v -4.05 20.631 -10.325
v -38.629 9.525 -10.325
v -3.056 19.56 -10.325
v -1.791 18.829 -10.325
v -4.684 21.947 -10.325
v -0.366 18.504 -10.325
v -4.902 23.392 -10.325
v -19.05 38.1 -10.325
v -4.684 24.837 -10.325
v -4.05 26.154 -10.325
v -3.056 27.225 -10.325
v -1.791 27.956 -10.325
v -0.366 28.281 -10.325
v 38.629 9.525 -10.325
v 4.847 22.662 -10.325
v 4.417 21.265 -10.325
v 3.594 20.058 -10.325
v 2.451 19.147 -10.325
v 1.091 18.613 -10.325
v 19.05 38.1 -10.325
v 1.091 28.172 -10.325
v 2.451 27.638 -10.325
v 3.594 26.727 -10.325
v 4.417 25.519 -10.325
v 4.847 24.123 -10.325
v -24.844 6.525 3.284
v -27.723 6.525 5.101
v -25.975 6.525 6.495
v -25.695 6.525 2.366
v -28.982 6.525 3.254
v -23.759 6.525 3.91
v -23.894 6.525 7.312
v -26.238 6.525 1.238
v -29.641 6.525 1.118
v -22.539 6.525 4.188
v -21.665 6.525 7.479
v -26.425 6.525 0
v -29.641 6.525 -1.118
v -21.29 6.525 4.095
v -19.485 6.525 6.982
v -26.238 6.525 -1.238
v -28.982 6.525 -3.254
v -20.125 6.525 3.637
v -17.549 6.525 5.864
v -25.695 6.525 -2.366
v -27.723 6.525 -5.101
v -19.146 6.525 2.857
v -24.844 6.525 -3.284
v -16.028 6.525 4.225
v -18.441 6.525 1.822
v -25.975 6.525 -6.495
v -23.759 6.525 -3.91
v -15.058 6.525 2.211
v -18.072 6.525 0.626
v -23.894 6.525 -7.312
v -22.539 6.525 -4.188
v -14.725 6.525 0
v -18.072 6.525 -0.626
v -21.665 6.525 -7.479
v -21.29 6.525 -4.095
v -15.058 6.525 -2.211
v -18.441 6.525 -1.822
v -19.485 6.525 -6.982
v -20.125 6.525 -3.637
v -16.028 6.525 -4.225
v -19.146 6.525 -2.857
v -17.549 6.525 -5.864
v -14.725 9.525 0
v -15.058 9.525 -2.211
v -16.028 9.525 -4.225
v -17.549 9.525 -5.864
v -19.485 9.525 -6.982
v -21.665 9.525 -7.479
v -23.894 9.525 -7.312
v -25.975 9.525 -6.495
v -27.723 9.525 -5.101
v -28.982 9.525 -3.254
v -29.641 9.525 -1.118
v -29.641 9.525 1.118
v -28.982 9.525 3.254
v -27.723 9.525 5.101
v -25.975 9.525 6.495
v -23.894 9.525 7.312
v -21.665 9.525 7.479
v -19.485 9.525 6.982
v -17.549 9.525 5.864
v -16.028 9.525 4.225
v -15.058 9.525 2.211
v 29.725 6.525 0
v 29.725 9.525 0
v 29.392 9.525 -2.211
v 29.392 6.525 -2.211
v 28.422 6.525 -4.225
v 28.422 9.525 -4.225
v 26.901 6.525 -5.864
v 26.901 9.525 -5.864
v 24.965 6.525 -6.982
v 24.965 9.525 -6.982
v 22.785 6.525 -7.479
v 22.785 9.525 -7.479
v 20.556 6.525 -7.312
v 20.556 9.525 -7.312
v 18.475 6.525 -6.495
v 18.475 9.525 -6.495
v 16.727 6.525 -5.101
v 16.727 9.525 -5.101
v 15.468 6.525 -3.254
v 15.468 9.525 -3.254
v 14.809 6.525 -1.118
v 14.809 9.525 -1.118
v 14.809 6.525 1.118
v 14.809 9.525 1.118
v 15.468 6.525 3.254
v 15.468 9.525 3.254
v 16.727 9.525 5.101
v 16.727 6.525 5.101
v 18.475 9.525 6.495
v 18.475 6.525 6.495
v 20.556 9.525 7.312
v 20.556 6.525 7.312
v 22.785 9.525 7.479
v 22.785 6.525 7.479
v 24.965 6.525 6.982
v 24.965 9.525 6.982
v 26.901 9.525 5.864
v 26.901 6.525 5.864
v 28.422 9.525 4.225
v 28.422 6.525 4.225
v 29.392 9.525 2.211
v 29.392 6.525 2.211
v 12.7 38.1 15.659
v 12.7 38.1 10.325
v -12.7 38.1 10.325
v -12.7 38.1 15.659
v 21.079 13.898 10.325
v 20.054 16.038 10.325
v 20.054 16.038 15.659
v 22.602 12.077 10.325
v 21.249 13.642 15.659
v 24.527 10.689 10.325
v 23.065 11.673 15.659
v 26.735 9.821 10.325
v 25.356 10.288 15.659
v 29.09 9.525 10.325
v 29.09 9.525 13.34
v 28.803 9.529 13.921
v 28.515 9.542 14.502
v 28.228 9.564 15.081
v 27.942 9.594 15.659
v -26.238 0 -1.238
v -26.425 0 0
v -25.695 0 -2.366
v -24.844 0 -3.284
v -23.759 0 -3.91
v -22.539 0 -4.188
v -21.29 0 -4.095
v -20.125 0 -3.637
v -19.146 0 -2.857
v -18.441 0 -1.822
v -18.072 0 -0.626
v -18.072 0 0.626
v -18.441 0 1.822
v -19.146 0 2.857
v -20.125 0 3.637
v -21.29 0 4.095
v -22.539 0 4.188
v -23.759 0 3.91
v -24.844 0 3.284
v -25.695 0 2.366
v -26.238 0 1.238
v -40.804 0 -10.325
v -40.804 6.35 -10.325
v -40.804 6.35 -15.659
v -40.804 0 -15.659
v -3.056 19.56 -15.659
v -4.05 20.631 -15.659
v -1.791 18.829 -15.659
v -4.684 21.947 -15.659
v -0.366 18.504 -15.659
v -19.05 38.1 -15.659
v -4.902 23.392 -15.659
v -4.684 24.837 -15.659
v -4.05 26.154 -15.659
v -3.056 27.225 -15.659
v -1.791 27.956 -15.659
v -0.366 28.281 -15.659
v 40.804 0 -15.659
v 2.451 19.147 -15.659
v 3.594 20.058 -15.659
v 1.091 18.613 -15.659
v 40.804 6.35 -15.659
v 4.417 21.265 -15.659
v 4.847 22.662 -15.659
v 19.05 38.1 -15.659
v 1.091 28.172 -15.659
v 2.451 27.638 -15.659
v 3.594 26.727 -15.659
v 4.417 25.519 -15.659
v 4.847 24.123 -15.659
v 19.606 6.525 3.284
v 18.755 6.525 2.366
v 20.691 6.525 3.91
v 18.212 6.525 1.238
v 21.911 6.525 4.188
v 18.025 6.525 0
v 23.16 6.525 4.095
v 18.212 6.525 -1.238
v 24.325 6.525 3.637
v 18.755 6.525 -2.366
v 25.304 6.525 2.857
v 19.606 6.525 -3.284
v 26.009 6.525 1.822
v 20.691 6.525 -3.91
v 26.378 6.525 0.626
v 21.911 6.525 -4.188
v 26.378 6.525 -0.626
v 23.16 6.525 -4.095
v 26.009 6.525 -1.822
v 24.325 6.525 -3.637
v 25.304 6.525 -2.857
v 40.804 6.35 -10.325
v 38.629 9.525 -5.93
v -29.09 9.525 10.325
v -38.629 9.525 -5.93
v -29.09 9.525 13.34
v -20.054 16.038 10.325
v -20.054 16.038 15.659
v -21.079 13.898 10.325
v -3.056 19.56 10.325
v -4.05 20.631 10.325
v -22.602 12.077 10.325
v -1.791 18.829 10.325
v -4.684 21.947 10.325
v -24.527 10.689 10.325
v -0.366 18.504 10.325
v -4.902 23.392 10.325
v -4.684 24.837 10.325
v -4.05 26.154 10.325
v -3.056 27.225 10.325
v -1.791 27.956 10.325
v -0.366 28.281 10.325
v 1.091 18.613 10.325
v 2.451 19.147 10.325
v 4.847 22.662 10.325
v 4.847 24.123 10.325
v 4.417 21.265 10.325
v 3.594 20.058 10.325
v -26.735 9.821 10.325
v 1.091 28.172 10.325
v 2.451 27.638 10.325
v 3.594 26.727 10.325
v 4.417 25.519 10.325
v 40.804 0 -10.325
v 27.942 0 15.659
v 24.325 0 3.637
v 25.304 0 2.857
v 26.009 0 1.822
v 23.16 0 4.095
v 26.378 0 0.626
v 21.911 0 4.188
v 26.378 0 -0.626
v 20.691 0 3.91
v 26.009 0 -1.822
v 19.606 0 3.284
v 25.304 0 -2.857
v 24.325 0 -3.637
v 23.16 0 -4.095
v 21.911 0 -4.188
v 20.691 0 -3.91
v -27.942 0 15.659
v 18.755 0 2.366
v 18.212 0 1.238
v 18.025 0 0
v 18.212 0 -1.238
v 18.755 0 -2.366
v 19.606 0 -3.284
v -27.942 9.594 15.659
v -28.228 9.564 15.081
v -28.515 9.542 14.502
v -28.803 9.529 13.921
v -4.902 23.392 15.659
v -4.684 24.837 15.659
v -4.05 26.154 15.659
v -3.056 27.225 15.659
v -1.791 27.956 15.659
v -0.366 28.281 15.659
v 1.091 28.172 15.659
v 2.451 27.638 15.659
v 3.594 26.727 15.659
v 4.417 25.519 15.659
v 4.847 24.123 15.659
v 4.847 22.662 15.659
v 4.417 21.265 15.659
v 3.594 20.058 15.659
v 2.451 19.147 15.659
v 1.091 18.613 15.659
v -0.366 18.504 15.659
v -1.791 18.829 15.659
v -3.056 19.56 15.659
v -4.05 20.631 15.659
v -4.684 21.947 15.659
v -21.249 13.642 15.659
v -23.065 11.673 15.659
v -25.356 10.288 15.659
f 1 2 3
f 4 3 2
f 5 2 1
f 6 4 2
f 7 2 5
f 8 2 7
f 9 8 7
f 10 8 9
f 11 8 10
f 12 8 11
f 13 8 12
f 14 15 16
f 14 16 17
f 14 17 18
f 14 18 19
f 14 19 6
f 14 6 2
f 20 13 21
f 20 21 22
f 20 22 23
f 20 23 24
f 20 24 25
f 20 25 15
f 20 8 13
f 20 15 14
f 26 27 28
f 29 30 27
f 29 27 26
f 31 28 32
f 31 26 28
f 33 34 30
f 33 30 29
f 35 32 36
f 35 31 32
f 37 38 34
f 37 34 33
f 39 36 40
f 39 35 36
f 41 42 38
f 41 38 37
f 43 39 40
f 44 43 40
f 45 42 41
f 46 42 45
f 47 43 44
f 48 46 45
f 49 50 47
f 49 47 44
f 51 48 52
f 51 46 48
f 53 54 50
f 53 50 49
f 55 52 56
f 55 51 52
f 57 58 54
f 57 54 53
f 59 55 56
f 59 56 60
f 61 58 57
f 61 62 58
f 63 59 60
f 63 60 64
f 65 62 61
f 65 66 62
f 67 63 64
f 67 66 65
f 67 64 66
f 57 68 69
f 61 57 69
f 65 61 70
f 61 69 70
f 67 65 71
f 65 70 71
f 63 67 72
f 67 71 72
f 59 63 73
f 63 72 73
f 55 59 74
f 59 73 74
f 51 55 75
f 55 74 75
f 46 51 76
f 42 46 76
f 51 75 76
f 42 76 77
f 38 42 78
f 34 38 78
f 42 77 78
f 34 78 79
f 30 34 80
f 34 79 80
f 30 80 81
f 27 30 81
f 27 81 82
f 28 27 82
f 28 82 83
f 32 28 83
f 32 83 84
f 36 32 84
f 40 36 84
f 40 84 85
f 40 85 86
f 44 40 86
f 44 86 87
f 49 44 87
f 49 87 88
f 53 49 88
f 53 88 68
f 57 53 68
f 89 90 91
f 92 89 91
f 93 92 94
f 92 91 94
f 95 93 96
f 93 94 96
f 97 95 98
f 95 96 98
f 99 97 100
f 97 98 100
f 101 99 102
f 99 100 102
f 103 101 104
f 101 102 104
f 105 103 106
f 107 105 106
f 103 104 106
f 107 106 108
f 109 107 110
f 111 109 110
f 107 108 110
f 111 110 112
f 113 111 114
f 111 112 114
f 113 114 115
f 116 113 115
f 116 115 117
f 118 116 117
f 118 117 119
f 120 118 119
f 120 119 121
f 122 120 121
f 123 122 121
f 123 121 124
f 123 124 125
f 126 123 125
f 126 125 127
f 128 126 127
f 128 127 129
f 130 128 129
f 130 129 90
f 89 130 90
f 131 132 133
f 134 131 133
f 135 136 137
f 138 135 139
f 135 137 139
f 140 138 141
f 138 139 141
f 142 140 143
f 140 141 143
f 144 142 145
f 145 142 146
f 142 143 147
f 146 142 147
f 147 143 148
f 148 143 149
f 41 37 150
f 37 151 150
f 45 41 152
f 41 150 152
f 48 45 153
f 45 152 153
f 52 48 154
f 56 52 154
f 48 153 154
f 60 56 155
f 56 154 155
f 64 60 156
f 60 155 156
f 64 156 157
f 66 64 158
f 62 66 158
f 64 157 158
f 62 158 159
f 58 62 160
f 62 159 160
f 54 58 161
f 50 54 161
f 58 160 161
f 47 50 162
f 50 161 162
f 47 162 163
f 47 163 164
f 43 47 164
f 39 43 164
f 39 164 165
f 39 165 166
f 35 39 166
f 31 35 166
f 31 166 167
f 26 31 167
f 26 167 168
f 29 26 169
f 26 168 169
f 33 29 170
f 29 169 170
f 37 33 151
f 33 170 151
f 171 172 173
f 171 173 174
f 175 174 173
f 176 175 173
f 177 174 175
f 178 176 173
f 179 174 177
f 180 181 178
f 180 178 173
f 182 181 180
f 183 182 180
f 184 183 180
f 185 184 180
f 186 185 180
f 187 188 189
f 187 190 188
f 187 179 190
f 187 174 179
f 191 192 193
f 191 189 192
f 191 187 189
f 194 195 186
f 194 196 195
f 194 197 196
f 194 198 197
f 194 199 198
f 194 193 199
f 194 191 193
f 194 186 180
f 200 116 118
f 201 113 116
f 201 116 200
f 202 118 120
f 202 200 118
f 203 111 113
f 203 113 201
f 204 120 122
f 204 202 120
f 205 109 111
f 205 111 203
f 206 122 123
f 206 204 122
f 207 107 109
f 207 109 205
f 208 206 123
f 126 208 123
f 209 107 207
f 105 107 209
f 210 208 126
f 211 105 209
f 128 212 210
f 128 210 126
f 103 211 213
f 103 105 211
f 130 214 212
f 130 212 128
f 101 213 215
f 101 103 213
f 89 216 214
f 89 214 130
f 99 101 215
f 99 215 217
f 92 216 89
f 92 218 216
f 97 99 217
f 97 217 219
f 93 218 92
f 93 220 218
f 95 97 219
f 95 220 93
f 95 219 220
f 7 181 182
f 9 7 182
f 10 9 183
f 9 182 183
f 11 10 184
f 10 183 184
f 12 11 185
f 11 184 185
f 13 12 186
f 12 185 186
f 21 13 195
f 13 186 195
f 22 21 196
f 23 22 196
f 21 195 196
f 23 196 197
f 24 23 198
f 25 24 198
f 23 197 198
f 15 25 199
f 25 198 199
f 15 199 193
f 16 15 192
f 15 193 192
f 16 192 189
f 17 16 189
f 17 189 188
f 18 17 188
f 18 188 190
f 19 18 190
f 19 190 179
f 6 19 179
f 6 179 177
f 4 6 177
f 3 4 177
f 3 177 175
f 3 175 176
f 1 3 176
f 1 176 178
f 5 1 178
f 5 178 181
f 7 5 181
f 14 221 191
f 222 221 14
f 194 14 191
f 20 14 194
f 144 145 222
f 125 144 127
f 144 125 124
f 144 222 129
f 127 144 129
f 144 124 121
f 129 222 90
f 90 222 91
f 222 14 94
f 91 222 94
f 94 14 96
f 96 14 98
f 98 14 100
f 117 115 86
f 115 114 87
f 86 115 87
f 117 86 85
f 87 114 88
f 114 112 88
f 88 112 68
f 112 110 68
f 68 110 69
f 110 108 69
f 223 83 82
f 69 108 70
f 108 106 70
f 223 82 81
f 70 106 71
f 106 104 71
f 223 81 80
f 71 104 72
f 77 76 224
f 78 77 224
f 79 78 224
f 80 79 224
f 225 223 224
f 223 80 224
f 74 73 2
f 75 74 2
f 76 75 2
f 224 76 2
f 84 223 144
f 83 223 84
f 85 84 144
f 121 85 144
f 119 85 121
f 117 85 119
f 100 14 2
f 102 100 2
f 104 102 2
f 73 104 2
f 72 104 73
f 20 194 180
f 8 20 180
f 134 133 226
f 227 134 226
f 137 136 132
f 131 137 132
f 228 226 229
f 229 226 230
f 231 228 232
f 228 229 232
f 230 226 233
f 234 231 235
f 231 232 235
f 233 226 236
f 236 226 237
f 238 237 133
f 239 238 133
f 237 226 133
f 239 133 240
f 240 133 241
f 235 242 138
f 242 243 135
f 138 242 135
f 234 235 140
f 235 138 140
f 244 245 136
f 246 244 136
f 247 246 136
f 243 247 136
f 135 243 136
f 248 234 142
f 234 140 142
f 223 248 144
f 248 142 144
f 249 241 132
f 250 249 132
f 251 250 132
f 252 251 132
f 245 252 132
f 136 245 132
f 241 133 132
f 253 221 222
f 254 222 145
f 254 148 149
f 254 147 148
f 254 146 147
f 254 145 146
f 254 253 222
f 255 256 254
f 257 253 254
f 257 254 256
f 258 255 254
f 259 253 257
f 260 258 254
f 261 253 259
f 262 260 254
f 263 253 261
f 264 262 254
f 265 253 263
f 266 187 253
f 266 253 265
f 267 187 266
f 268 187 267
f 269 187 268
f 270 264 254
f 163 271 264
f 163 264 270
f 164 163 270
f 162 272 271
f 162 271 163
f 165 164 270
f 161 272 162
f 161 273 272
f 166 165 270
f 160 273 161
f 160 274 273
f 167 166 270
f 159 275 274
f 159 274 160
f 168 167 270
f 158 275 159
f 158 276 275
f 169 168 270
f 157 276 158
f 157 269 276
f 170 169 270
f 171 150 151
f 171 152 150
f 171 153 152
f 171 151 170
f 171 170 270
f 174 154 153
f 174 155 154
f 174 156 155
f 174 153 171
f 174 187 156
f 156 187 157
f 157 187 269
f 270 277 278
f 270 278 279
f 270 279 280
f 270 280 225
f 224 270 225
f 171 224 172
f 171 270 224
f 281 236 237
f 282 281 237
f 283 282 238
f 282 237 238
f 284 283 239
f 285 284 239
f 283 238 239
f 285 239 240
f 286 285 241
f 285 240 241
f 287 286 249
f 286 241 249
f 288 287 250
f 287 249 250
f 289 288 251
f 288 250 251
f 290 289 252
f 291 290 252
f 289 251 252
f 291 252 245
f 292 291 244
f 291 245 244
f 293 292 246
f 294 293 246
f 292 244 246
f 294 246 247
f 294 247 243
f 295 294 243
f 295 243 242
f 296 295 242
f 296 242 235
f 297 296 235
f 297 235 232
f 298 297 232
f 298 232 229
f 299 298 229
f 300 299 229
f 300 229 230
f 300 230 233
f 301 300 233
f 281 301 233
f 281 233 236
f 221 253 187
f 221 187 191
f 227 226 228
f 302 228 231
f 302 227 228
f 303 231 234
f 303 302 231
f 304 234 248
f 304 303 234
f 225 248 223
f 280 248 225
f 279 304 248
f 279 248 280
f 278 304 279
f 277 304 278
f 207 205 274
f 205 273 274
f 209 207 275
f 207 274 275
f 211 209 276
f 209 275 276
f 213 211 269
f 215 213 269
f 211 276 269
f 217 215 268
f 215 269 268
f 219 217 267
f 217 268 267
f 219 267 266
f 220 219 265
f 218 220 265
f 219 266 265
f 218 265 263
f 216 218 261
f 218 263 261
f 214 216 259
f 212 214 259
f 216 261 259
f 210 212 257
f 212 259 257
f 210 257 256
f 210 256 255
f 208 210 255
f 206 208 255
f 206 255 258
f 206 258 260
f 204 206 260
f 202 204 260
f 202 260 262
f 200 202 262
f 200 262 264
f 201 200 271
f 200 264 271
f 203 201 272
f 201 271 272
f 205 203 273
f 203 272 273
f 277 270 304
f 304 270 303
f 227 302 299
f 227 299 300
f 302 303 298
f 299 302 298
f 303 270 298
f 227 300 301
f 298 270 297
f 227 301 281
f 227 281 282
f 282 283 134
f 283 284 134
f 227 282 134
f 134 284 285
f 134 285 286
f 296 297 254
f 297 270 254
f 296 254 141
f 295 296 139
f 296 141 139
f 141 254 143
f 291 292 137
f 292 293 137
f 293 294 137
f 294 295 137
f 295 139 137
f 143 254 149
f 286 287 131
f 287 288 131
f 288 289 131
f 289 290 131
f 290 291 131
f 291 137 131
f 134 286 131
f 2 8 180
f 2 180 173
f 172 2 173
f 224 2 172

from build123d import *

# Parameters (mm, degrees)
BOSS_EXTRUDE1_DEPTH                     = 38.1
SKETCH2_W                               = 88.9
SKETCH2_H                               = 20.6502
CUT_EXTRUDE1_DEPTH                      = 28.575
CBORE_FOR_M8_HEX_HEAD_BOLT2_D           = 8.4
CBORE_FOR_M8_HEX_HEAD_BOLT2_CBORE_D     = 15
CBORE_FOR_M8_HEX_HEAD_BOLT2_CBORE_DEPTH = 3
CUT_EXTRUDE4_REACH                      = 66.902
FILLET1_R                               = 9.525
CUT_EXTRUDE5_START                      = -11.760877
CUT_EXTRUDE5_DEPTH                      = 11.760877
W_0_386_DIAMETER_HOLE1_D                = 9.8044
CUT_EXTRUDE7_REACH                      = 93.785
SKETCH14_W                              = 2.032
SKETCH14_H                              = 38.1


with BuildPart() as part:
    # Sketch1 → Boss-Extrude1 (new body)
    with BuildSketch(Plane(origin=(0, 0, 0), x_dir=(1, 0, 0), z_dir=(0, 1, 0))):
        Polygon((26.936371436, -17.6911), (-26.936371436, -17.6911), (-44.45, 17.6911), (44.45, 17.6911), align=None)
    extrude(amount=BOSS_EXTRUDE1_DEPTH)

    # Sketch2 → Cut-Extrude1 (cut)
    with BuildSketch(Plane(origin=(0, 38.1, 0), x_dir=(1, 0, 0), z_dir=(0, 1, 0))):
        Rectangle(SKETCH2_W, SKETCH2_H)
    extrude(amount=-CUT_EXTRUDE1_DEPTH, mode=Mode.SUBTRACT)

    # CBORE for M8 Hex Head Bolt2 (through all)
    with Locations(Plane(origin=(0, 9.525, 0), x_dir=(1, 0, 0), z_dir=(0, 1, 0))):
        with Locations((-22.225, 0), (22.225, 0)):
            CounterBoreHole(CBORE_FOR_M8_HEX_HEAD_BOLT2_D / 2, CBORE_FOR_M8_HEX_HEAD_BOLT2_CBORE_D / 2, CBORE_FOR_M8_HEX_HEAD_BOLT2_CBORE_DEPTH)

    # Sketch9 → Cut-Extrude4 (cut, up to next)
    with BuildSketch(Plane(origin=(0, 0, 10.3251), x_dir=(-1, 0, 0), z_dir=(0, 0, -1)), mode=Mode.PRIVATE) as cut_extrude4_sk1:
        Polygon((12.7, 38.1), (22.225, 9.525), (30.582424762, 9.525), (30.582424762, 38.1), align=None)
    cut_extrude4_tool1 = extrude(cut_extrude4_sk1.sketch, amount=-CUT_EXTRUDE4_REACH, mode=Mode.PRIVATE) & part.part
    # Sketch9 → Cut-Extrude4 (cut, up to next)
    with BuildSketch(Plane(origin=(0, 0, 10.3251), x_dir=(-1, 0, 0), z_dir=(0, 0, -1)), mode=Mode.PRIVATE) as cut_extrude4_sk2:
        Polygon((-30.582424762, 9.525), (-22.225, 9.525), (-12.7, 38.1), (-30.582424762, 38.1), align=None)
    cut_extrude4_tool2 = extrude(cut_extrude4_sk2.sketch, amount=-CUT_EXTRUDE4_REACH, mode=Mode.PRIVATE) & part.part
    add(cut_extrude4_tool1.solids().sort_by_distance((-23.734333, 25.541276, 10.3251))[0], mode=Mode.SUBTRACT)
    add(cut_extrude4_tool2.solids().sort_by_distance((23.734333, 25.541276, 10.3251))[0], mode=Mode.SUBTRACT)

    # Fillet1
    fillet1_edges = [part.edges().sort_by_distance(p)[0] for p in [
        (-22.225, 9.525, 14.0081),
        (22.225, 9.525, 14.0081),
    ]]
    fillet(fillet1_edges, radius=FILLET1_R)

    # Sketch10 → Cut-Extrude5 (cut)
    with BuildSketch(Plane(origin=(0, 0, -17.6911), x_dir=(-1, 0, 0), z_dir=(0, 0, -1)).offset(CUT_EXTRUDE5_START)):
        Polygon((-40.803946674, 6.35), (-19.05, 38.1), (-44.45, 38.1), (-44.45, 0), (-40.803946674, 0), align=None)
        Polygon((44.45, 38.1), (19.05, 38.1), (40.803946674, 6.35), (40.803946674, 0), (44.45, 0), align=None)
    extrude(amount=CUT_EXTRUDE5_DEPTH, mode=Mode.SUBTRACT)

    # W (0.386) Diameter Hole1 (through all)
    with Locations(Plane.XY.offset(17.6911)):
        with Locations((0, 23.392384)):
            Hole(W_0_386_DIAMETER_HOLE1_D / 2)

    # Cut-Extrude7: up to this face of the body (flat: up to its plane)
    cut_extrude7_end = Plane(part.part.faces().sort_by_distance((-40.803946674, 3.175, -14.0081))[0])
    # Sketch14 → Cut-Extrude7 (cut, up to the picked face)
    with BuildSketch(Plane(origin=(40.803946674, 0, 0), x_dir=(0, 0, -1), z_dir=(1, 0, 0)), mode=Mode.PRIVATE) as cut_extrude7_sk1:
        with Locations((-16.6751, 19.05)):
            Rectangle(SKETCH14_W, SKETCH14_H)
    cut_extrude7_tool1 = split(extrude(cut_extrude7_sk1.sketch, amount=-CUT_EXTRUDE7_REACH, mode=Mode.PRIVATE), bisect_by=cut_extrude7_end, keep=Keep.BOTH, mode=Mode.PRIVATE)
    # Sketch14 → Cut-Extrude7 (cut, up to the picked face)
    with BuildSketch(Plane(origin=(40.803946674, 0, 0), x_dir=(0, 0, -1), z_dir=(1, 0, 0)), mode=Mode.PRIVATE) as cut_extrude7_sk2:
        with Locations((16.6751, 19.05)):
            Rectangle(SKETCH14_W, SKETCH14_H)
    cut_extrude7_tool2 = split(extrude(cut_extrude7_sk2.sketch, amount=-CUT_EXTRUDE7_REACH, mode=Mode.PRIVATE), bisect_by=cut_extrude7_end, keep=Keep.BOTH, mode=Mode.PRIVATE)
    add(cut_extrude7_tool1.solids().sort_by(Axis((40.803947, 19.05, 16.6751), (-1, 0, 0)))[0], mode=Mode.SUBTRACT)
    add(cut_extrude7_tool2.solids().sort_by(Axis((40.803947, 19.05, -16.6751), (-1, 0, 0)))[0], mode=Mode.SUBTRACT)


solid = part.part
